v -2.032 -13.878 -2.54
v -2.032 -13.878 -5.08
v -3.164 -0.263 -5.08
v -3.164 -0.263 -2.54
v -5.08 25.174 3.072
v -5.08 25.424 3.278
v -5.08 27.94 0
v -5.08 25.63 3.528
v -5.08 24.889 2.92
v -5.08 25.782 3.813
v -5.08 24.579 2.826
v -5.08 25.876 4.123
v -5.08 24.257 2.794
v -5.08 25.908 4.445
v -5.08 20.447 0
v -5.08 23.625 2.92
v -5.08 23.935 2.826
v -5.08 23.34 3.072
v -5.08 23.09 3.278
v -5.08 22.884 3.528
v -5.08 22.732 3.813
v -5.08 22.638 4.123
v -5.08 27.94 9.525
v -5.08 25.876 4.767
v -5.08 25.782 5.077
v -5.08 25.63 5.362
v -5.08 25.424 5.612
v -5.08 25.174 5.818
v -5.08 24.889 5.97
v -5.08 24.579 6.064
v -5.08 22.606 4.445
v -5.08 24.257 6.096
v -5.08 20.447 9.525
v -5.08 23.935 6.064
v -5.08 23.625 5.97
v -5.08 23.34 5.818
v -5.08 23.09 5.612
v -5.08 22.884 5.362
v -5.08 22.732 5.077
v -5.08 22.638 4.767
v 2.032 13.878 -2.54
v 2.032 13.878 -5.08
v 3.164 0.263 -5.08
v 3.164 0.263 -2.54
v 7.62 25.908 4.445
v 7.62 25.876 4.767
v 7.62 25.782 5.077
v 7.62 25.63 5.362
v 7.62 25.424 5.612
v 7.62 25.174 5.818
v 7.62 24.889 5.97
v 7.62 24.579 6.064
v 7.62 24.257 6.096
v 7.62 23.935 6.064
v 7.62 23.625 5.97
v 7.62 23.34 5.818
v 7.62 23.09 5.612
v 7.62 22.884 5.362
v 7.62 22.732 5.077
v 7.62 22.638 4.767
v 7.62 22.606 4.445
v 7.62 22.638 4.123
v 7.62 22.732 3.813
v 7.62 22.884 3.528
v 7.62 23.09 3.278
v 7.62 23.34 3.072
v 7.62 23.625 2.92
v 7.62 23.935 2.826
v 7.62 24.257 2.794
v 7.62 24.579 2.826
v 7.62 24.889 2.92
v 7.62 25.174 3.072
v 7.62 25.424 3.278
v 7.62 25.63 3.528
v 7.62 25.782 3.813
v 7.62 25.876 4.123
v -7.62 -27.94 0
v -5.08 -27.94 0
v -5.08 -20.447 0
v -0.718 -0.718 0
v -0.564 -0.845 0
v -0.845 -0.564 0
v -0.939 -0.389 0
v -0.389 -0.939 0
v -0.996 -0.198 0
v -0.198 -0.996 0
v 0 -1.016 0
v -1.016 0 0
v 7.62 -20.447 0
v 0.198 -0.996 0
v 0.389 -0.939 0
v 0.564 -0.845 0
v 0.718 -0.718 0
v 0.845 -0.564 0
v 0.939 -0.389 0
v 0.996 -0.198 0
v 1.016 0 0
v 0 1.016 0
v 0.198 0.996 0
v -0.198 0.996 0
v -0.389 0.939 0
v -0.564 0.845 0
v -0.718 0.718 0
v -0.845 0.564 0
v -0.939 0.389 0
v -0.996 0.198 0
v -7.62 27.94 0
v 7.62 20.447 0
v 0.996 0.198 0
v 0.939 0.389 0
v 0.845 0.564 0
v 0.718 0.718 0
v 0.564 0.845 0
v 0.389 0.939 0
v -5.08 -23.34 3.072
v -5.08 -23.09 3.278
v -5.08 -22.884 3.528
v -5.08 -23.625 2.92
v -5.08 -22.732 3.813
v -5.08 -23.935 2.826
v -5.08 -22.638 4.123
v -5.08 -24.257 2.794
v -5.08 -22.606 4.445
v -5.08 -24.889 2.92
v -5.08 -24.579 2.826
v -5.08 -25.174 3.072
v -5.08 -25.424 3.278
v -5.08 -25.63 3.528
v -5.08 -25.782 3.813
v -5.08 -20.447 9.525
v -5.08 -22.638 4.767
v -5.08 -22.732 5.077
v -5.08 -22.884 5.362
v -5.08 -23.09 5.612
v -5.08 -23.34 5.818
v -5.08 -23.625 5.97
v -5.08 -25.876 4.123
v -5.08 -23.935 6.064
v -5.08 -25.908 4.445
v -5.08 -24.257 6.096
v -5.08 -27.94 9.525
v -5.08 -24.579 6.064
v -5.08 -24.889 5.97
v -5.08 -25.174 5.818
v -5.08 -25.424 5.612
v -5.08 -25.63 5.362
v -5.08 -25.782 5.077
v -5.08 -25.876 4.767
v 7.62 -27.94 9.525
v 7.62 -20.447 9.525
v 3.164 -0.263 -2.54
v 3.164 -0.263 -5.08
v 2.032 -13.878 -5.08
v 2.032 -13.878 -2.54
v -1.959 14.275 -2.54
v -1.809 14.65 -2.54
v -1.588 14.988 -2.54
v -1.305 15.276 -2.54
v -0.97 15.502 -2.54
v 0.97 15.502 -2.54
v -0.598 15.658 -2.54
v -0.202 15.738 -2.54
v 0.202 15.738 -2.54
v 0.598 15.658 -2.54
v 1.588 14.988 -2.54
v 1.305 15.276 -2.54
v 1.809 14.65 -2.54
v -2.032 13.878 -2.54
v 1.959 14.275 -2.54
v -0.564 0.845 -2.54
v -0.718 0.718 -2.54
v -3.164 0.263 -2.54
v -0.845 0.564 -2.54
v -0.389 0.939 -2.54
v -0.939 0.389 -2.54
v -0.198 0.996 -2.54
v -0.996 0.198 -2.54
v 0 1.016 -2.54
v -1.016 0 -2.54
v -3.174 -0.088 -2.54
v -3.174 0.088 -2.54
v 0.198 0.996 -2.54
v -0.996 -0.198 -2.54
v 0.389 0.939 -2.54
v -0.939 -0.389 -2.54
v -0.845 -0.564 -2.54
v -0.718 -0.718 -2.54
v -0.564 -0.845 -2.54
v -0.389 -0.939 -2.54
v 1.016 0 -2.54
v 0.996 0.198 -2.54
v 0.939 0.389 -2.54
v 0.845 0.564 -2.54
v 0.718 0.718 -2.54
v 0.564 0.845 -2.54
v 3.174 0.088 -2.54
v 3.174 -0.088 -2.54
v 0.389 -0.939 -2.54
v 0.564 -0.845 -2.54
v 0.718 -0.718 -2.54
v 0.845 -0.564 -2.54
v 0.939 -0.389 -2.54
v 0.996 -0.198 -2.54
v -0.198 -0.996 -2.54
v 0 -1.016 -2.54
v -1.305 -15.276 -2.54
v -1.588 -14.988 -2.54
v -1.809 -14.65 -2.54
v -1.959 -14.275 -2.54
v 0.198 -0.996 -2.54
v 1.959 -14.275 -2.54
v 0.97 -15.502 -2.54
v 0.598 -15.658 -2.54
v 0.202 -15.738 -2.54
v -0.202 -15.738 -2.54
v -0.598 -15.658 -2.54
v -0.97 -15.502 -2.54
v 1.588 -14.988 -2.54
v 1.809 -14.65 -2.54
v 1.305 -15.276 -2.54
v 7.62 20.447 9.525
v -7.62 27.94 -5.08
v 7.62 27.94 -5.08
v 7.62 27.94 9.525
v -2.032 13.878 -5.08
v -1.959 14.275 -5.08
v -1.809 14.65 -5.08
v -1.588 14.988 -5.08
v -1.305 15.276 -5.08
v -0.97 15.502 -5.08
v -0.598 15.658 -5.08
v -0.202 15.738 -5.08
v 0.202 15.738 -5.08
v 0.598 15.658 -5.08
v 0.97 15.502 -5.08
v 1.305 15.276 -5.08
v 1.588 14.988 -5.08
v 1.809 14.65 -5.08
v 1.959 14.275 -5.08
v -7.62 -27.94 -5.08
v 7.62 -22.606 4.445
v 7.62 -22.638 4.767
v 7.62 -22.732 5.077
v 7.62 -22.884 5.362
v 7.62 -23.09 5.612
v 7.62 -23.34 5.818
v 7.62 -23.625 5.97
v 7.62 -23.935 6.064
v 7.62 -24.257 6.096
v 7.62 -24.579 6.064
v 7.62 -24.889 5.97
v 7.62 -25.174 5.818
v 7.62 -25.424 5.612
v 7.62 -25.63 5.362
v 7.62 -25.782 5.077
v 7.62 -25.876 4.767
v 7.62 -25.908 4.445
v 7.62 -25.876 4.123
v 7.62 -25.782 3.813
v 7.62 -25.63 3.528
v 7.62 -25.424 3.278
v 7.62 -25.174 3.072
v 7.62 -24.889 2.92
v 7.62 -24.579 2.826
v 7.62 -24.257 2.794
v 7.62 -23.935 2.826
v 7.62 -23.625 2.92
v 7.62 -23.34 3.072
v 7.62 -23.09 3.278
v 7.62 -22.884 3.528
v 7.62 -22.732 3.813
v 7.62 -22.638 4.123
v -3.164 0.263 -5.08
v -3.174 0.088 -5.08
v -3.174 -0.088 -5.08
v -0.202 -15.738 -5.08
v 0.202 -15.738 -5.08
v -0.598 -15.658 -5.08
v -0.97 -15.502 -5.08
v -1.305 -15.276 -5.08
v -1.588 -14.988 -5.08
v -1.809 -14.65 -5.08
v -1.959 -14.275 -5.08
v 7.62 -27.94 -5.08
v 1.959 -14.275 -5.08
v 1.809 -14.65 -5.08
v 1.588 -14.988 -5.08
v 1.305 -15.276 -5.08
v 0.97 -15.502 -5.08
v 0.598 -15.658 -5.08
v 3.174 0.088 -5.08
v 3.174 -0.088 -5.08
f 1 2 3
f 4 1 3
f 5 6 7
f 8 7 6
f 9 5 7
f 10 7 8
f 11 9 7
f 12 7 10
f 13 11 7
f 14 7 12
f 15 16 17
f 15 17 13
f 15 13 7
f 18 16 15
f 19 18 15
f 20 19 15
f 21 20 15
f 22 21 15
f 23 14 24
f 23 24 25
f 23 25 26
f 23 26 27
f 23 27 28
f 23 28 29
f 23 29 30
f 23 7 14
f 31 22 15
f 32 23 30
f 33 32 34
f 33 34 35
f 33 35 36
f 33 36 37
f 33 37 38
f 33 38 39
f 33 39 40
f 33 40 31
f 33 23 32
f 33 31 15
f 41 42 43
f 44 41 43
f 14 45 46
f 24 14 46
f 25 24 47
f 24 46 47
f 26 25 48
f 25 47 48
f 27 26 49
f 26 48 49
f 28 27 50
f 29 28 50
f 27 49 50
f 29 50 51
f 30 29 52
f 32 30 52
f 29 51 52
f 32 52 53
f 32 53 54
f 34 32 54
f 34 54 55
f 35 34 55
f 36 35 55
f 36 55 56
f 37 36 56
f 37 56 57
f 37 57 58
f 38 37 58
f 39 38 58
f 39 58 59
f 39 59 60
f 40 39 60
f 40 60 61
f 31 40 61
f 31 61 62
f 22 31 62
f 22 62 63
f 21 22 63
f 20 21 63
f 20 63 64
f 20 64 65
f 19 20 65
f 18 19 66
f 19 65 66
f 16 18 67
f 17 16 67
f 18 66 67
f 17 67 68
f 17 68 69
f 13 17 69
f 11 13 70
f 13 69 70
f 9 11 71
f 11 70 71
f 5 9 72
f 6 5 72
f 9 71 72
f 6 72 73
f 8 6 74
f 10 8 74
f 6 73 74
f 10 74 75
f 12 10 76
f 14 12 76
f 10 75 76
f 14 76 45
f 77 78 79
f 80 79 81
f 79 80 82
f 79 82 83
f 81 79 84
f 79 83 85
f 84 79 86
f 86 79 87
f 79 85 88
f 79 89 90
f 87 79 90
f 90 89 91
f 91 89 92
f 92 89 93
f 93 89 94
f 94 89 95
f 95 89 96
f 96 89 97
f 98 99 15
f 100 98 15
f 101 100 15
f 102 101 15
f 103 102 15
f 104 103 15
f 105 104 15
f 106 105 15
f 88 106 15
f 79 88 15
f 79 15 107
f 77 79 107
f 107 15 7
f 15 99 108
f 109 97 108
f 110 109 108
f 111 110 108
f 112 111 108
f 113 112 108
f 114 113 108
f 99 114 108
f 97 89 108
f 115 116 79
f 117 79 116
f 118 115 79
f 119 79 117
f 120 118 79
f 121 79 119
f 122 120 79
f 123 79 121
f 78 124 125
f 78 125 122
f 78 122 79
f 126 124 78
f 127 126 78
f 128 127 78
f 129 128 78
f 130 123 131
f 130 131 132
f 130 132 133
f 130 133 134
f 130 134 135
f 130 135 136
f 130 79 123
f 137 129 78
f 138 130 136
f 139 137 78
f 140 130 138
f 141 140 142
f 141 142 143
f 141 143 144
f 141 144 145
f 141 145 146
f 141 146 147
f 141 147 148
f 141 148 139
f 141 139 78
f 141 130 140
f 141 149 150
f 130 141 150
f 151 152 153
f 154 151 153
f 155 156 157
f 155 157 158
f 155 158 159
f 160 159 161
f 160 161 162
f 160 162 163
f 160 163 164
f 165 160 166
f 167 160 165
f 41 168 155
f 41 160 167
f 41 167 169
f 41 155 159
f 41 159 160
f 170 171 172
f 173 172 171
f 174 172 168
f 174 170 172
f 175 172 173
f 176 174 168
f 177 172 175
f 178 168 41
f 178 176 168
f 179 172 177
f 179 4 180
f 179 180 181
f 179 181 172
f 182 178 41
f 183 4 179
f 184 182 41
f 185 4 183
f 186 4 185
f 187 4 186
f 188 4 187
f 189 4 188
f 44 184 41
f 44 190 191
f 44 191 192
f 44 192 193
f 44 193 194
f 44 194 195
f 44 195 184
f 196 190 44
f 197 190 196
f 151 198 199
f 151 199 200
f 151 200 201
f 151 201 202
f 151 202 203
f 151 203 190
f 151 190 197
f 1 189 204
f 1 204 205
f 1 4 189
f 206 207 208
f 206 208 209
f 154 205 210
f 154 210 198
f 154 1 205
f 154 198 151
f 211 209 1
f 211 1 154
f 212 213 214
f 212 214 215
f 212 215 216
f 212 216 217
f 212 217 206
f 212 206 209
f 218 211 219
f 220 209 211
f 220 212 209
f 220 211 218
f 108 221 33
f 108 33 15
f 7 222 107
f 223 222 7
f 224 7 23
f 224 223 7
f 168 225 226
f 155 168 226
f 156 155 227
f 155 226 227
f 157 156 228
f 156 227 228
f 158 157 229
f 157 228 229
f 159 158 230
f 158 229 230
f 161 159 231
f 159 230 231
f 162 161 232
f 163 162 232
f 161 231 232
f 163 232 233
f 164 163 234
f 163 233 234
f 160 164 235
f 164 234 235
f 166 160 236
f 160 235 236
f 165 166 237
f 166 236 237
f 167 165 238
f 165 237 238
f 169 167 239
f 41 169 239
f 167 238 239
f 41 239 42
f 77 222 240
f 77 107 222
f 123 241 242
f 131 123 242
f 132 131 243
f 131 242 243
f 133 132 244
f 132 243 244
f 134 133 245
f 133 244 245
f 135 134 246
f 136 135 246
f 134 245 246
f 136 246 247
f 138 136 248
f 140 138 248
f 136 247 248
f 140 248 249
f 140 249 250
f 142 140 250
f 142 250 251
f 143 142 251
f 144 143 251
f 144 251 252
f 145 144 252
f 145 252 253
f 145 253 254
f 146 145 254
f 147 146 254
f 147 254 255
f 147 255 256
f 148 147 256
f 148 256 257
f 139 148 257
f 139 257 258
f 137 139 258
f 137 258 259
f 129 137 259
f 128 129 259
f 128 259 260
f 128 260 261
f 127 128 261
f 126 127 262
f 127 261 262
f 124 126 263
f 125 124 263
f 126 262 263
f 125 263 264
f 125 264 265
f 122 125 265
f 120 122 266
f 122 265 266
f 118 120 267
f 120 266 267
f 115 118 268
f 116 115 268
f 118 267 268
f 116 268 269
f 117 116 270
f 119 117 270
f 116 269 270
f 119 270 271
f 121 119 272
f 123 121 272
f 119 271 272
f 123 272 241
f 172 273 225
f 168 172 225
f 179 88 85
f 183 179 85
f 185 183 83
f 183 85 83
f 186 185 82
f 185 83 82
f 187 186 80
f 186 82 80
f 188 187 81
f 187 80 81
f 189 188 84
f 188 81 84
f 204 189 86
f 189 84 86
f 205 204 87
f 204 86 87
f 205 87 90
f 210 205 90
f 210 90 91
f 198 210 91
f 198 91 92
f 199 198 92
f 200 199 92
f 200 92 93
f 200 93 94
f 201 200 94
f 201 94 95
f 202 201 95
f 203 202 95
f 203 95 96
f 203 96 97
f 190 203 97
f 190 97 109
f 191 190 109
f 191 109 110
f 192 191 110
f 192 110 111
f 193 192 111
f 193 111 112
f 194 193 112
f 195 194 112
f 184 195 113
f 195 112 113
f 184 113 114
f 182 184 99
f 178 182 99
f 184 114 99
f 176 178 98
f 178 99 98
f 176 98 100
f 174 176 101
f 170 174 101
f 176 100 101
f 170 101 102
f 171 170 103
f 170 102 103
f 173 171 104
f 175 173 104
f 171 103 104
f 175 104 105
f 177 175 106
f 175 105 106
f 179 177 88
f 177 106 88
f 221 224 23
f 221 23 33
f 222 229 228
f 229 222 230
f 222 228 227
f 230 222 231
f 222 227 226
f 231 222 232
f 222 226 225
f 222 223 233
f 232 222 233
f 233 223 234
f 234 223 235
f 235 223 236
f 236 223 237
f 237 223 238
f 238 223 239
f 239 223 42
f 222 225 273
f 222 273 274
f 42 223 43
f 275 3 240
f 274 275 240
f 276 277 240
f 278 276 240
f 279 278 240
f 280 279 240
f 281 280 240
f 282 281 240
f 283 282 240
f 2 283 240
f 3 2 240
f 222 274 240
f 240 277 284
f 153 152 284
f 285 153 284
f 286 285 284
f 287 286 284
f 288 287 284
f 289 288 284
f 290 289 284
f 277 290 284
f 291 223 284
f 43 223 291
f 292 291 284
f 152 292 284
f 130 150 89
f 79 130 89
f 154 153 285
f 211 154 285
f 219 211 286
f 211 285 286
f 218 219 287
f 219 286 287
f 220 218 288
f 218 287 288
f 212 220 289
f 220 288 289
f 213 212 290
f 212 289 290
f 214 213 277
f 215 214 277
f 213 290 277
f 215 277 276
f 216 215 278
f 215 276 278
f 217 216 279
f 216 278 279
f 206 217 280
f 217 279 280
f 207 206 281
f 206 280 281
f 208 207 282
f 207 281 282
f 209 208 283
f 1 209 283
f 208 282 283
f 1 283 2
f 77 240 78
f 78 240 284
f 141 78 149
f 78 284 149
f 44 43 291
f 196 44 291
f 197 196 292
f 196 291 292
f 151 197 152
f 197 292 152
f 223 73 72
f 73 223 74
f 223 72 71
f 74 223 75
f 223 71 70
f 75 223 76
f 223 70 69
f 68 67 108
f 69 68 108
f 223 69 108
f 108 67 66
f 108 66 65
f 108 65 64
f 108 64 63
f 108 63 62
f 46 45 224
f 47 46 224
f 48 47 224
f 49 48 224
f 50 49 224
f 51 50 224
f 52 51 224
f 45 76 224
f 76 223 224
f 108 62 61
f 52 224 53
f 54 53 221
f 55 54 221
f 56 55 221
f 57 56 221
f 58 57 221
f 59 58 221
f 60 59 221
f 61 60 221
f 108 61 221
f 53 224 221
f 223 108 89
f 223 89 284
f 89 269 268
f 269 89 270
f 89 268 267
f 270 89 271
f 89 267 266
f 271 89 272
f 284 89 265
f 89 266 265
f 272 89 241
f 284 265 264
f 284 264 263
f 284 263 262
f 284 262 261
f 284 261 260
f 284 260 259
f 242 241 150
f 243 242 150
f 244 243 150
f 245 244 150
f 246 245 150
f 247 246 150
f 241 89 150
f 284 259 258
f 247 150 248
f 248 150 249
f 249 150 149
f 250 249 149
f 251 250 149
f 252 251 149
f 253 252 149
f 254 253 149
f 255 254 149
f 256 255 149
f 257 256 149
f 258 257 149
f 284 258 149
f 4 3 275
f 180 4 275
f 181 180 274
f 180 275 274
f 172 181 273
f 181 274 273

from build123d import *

# Parameters (mm, degrees)
F1_DEPTH  = 7.62
F3_R      = 1.651
F4_DEPTH  = 25.4
F6_DEPTH  = 2.54
F8_D      = 2.032
F9_W      = 7.493
F9_H      = 9.525
F9_R      = 1.651
F10_DEPTH = 2.54


with BuildPart() as f1:
    # F0 (on Right) → F1 (new body, symmetric)
    with BuildSketch(Plane.YZ):
        Polygon((0, 0), (0, -5.08), (27.94, -5.08), (27.94, 9.525), (20.447, 9.525), (20.447, 0), align=None)
    extrude(amount=F1_DEPTH, both=True)

    # F2: F1 across plane


with BuildPart() as f1_1:
    add(f1.part)
    add(f1.part.mirror(Plane.XZ))

    # F3 (on face) → F4 (cut)
    with BuildSketch(Plane.YZ.offset(7.62)):
        with Locations((-24.257, 4.445)):
            Circle(F3_R)
        with Locations((24.257, 4.445)):
            Circle(F3_R)
    extrude(amount=-F4_DEPTH, mode=Mode.SUBTRACT)

    # F5 (on face) → F6 (cut)
    with BuildSketch(Plane(origin=(0, 0, -5.08), x_dir=(1, 0, 0), z_dir=(0, 0, -1))):
        with BuildLine():
            Line((-3.164081, -0.263095), (-2.032, -13.877949))
            ThreePointArc((-2.032, -13.877949), (0, -15.748), (2.032, -13.877949))
            Line((2.032, -13.877949), (3.164081, -0.263095))
            ThreePointArc((3.164081, -0.263095), (3.175, 0), (3.164081, 0.263095))
            Line((3.164081, 0.263095), (2.032, 13.877949))
            ThreePointArc((2.032, 13.877949), (0, 15.748), (-2.032, 13.877949))
            Line((-2.032, 13.877949), (-3.164081, 0.263095))
            ThreePointArc((-3.164081, 0.263095), (-3.175, 0), (-3.164081, -0.263095))
        make_face()
    extrude(amount=-F6_DEPTH, mode=Mode.SUBTRACT)

    # F8 (through all)
    with Locations(Plane(origin=(0, 0, -2.54), x_dir=(1, 0, 0), z_dir=(0, 0, -1))):
        with Locations((0, 0)):
            Hole(F8_D / 2)

    # F9 (on face) → F10 (cut)
    with BuildSketch(Plane(origin=(-7.62, 0, 0), x_dir=(0, -1, 0), z_dir=(-1, 0, 0))):
        with Locations((-24.1935, 4.7625)):
            Rectangle(F9_W, F9_H)
        with Locations((-24.257, 4.445)):
            Circle(F9_R, mode=Mode.SUBTRACT)
        with Locations((24.1935, 4.7625)):
            Rectangle(F9_W, F9_H)
        with Locations((24.257, 4.445)):
            Circle(F9_R, mode=Mode.SUBTRACT)
    extrude(amount=-F10_DEPTH, mode=Mode.SUBTRACT)


solid = f1_1.part
